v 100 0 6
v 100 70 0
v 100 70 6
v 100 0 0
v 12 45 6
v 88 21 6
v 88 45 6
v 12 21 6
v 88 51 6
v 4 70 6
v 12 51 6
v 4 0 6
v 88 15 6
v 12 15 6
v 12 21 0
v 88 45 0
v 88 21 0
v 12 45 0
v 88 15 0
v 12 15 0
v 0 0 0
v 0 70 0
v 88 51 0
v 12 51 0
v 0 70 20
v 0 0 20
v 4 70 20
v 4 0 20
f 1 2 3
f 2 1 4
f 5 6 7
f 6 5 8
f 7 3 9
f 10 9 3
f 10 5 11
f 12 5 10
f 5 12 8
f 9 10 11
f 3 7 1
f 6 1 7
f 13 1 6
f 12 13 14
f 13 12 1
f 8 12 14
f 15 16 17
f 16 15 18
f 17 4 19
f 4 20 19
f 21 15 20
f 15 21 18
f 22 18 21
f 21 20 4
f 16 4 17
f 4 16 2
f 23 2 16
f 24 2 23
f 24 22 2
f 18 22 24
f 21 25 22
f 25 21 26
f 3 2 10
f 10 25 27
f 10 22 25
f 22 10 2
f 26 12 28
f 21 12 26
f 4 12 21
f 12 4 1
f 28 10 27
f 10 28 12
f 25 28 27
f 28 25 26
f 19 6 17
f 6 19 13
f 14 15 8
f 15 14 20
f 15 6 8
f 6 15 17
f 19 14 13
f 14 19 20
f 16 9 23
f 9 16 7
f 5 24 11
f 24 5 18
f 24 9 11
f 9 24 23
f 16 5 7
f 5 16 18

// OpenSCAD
// Original MechIntel educational model. CC0-1.0. Units: mm.
// Not a standardized or load-rated component.
$fn=96;
length=100;
width=70;
base=6;
fence=4;
height=20;
slot_width=6;
$fn=64;
difference(){union(){
translate([0,0,0]) cube([length,width,base]);
translate([0,0,base]) cube([fence,width,height-base]);
}
translate([12,15,-1]) cube([76,slot_width,base+2]);
translate([12,45,-1]) cube([76,slot_width,base+2]);
}
